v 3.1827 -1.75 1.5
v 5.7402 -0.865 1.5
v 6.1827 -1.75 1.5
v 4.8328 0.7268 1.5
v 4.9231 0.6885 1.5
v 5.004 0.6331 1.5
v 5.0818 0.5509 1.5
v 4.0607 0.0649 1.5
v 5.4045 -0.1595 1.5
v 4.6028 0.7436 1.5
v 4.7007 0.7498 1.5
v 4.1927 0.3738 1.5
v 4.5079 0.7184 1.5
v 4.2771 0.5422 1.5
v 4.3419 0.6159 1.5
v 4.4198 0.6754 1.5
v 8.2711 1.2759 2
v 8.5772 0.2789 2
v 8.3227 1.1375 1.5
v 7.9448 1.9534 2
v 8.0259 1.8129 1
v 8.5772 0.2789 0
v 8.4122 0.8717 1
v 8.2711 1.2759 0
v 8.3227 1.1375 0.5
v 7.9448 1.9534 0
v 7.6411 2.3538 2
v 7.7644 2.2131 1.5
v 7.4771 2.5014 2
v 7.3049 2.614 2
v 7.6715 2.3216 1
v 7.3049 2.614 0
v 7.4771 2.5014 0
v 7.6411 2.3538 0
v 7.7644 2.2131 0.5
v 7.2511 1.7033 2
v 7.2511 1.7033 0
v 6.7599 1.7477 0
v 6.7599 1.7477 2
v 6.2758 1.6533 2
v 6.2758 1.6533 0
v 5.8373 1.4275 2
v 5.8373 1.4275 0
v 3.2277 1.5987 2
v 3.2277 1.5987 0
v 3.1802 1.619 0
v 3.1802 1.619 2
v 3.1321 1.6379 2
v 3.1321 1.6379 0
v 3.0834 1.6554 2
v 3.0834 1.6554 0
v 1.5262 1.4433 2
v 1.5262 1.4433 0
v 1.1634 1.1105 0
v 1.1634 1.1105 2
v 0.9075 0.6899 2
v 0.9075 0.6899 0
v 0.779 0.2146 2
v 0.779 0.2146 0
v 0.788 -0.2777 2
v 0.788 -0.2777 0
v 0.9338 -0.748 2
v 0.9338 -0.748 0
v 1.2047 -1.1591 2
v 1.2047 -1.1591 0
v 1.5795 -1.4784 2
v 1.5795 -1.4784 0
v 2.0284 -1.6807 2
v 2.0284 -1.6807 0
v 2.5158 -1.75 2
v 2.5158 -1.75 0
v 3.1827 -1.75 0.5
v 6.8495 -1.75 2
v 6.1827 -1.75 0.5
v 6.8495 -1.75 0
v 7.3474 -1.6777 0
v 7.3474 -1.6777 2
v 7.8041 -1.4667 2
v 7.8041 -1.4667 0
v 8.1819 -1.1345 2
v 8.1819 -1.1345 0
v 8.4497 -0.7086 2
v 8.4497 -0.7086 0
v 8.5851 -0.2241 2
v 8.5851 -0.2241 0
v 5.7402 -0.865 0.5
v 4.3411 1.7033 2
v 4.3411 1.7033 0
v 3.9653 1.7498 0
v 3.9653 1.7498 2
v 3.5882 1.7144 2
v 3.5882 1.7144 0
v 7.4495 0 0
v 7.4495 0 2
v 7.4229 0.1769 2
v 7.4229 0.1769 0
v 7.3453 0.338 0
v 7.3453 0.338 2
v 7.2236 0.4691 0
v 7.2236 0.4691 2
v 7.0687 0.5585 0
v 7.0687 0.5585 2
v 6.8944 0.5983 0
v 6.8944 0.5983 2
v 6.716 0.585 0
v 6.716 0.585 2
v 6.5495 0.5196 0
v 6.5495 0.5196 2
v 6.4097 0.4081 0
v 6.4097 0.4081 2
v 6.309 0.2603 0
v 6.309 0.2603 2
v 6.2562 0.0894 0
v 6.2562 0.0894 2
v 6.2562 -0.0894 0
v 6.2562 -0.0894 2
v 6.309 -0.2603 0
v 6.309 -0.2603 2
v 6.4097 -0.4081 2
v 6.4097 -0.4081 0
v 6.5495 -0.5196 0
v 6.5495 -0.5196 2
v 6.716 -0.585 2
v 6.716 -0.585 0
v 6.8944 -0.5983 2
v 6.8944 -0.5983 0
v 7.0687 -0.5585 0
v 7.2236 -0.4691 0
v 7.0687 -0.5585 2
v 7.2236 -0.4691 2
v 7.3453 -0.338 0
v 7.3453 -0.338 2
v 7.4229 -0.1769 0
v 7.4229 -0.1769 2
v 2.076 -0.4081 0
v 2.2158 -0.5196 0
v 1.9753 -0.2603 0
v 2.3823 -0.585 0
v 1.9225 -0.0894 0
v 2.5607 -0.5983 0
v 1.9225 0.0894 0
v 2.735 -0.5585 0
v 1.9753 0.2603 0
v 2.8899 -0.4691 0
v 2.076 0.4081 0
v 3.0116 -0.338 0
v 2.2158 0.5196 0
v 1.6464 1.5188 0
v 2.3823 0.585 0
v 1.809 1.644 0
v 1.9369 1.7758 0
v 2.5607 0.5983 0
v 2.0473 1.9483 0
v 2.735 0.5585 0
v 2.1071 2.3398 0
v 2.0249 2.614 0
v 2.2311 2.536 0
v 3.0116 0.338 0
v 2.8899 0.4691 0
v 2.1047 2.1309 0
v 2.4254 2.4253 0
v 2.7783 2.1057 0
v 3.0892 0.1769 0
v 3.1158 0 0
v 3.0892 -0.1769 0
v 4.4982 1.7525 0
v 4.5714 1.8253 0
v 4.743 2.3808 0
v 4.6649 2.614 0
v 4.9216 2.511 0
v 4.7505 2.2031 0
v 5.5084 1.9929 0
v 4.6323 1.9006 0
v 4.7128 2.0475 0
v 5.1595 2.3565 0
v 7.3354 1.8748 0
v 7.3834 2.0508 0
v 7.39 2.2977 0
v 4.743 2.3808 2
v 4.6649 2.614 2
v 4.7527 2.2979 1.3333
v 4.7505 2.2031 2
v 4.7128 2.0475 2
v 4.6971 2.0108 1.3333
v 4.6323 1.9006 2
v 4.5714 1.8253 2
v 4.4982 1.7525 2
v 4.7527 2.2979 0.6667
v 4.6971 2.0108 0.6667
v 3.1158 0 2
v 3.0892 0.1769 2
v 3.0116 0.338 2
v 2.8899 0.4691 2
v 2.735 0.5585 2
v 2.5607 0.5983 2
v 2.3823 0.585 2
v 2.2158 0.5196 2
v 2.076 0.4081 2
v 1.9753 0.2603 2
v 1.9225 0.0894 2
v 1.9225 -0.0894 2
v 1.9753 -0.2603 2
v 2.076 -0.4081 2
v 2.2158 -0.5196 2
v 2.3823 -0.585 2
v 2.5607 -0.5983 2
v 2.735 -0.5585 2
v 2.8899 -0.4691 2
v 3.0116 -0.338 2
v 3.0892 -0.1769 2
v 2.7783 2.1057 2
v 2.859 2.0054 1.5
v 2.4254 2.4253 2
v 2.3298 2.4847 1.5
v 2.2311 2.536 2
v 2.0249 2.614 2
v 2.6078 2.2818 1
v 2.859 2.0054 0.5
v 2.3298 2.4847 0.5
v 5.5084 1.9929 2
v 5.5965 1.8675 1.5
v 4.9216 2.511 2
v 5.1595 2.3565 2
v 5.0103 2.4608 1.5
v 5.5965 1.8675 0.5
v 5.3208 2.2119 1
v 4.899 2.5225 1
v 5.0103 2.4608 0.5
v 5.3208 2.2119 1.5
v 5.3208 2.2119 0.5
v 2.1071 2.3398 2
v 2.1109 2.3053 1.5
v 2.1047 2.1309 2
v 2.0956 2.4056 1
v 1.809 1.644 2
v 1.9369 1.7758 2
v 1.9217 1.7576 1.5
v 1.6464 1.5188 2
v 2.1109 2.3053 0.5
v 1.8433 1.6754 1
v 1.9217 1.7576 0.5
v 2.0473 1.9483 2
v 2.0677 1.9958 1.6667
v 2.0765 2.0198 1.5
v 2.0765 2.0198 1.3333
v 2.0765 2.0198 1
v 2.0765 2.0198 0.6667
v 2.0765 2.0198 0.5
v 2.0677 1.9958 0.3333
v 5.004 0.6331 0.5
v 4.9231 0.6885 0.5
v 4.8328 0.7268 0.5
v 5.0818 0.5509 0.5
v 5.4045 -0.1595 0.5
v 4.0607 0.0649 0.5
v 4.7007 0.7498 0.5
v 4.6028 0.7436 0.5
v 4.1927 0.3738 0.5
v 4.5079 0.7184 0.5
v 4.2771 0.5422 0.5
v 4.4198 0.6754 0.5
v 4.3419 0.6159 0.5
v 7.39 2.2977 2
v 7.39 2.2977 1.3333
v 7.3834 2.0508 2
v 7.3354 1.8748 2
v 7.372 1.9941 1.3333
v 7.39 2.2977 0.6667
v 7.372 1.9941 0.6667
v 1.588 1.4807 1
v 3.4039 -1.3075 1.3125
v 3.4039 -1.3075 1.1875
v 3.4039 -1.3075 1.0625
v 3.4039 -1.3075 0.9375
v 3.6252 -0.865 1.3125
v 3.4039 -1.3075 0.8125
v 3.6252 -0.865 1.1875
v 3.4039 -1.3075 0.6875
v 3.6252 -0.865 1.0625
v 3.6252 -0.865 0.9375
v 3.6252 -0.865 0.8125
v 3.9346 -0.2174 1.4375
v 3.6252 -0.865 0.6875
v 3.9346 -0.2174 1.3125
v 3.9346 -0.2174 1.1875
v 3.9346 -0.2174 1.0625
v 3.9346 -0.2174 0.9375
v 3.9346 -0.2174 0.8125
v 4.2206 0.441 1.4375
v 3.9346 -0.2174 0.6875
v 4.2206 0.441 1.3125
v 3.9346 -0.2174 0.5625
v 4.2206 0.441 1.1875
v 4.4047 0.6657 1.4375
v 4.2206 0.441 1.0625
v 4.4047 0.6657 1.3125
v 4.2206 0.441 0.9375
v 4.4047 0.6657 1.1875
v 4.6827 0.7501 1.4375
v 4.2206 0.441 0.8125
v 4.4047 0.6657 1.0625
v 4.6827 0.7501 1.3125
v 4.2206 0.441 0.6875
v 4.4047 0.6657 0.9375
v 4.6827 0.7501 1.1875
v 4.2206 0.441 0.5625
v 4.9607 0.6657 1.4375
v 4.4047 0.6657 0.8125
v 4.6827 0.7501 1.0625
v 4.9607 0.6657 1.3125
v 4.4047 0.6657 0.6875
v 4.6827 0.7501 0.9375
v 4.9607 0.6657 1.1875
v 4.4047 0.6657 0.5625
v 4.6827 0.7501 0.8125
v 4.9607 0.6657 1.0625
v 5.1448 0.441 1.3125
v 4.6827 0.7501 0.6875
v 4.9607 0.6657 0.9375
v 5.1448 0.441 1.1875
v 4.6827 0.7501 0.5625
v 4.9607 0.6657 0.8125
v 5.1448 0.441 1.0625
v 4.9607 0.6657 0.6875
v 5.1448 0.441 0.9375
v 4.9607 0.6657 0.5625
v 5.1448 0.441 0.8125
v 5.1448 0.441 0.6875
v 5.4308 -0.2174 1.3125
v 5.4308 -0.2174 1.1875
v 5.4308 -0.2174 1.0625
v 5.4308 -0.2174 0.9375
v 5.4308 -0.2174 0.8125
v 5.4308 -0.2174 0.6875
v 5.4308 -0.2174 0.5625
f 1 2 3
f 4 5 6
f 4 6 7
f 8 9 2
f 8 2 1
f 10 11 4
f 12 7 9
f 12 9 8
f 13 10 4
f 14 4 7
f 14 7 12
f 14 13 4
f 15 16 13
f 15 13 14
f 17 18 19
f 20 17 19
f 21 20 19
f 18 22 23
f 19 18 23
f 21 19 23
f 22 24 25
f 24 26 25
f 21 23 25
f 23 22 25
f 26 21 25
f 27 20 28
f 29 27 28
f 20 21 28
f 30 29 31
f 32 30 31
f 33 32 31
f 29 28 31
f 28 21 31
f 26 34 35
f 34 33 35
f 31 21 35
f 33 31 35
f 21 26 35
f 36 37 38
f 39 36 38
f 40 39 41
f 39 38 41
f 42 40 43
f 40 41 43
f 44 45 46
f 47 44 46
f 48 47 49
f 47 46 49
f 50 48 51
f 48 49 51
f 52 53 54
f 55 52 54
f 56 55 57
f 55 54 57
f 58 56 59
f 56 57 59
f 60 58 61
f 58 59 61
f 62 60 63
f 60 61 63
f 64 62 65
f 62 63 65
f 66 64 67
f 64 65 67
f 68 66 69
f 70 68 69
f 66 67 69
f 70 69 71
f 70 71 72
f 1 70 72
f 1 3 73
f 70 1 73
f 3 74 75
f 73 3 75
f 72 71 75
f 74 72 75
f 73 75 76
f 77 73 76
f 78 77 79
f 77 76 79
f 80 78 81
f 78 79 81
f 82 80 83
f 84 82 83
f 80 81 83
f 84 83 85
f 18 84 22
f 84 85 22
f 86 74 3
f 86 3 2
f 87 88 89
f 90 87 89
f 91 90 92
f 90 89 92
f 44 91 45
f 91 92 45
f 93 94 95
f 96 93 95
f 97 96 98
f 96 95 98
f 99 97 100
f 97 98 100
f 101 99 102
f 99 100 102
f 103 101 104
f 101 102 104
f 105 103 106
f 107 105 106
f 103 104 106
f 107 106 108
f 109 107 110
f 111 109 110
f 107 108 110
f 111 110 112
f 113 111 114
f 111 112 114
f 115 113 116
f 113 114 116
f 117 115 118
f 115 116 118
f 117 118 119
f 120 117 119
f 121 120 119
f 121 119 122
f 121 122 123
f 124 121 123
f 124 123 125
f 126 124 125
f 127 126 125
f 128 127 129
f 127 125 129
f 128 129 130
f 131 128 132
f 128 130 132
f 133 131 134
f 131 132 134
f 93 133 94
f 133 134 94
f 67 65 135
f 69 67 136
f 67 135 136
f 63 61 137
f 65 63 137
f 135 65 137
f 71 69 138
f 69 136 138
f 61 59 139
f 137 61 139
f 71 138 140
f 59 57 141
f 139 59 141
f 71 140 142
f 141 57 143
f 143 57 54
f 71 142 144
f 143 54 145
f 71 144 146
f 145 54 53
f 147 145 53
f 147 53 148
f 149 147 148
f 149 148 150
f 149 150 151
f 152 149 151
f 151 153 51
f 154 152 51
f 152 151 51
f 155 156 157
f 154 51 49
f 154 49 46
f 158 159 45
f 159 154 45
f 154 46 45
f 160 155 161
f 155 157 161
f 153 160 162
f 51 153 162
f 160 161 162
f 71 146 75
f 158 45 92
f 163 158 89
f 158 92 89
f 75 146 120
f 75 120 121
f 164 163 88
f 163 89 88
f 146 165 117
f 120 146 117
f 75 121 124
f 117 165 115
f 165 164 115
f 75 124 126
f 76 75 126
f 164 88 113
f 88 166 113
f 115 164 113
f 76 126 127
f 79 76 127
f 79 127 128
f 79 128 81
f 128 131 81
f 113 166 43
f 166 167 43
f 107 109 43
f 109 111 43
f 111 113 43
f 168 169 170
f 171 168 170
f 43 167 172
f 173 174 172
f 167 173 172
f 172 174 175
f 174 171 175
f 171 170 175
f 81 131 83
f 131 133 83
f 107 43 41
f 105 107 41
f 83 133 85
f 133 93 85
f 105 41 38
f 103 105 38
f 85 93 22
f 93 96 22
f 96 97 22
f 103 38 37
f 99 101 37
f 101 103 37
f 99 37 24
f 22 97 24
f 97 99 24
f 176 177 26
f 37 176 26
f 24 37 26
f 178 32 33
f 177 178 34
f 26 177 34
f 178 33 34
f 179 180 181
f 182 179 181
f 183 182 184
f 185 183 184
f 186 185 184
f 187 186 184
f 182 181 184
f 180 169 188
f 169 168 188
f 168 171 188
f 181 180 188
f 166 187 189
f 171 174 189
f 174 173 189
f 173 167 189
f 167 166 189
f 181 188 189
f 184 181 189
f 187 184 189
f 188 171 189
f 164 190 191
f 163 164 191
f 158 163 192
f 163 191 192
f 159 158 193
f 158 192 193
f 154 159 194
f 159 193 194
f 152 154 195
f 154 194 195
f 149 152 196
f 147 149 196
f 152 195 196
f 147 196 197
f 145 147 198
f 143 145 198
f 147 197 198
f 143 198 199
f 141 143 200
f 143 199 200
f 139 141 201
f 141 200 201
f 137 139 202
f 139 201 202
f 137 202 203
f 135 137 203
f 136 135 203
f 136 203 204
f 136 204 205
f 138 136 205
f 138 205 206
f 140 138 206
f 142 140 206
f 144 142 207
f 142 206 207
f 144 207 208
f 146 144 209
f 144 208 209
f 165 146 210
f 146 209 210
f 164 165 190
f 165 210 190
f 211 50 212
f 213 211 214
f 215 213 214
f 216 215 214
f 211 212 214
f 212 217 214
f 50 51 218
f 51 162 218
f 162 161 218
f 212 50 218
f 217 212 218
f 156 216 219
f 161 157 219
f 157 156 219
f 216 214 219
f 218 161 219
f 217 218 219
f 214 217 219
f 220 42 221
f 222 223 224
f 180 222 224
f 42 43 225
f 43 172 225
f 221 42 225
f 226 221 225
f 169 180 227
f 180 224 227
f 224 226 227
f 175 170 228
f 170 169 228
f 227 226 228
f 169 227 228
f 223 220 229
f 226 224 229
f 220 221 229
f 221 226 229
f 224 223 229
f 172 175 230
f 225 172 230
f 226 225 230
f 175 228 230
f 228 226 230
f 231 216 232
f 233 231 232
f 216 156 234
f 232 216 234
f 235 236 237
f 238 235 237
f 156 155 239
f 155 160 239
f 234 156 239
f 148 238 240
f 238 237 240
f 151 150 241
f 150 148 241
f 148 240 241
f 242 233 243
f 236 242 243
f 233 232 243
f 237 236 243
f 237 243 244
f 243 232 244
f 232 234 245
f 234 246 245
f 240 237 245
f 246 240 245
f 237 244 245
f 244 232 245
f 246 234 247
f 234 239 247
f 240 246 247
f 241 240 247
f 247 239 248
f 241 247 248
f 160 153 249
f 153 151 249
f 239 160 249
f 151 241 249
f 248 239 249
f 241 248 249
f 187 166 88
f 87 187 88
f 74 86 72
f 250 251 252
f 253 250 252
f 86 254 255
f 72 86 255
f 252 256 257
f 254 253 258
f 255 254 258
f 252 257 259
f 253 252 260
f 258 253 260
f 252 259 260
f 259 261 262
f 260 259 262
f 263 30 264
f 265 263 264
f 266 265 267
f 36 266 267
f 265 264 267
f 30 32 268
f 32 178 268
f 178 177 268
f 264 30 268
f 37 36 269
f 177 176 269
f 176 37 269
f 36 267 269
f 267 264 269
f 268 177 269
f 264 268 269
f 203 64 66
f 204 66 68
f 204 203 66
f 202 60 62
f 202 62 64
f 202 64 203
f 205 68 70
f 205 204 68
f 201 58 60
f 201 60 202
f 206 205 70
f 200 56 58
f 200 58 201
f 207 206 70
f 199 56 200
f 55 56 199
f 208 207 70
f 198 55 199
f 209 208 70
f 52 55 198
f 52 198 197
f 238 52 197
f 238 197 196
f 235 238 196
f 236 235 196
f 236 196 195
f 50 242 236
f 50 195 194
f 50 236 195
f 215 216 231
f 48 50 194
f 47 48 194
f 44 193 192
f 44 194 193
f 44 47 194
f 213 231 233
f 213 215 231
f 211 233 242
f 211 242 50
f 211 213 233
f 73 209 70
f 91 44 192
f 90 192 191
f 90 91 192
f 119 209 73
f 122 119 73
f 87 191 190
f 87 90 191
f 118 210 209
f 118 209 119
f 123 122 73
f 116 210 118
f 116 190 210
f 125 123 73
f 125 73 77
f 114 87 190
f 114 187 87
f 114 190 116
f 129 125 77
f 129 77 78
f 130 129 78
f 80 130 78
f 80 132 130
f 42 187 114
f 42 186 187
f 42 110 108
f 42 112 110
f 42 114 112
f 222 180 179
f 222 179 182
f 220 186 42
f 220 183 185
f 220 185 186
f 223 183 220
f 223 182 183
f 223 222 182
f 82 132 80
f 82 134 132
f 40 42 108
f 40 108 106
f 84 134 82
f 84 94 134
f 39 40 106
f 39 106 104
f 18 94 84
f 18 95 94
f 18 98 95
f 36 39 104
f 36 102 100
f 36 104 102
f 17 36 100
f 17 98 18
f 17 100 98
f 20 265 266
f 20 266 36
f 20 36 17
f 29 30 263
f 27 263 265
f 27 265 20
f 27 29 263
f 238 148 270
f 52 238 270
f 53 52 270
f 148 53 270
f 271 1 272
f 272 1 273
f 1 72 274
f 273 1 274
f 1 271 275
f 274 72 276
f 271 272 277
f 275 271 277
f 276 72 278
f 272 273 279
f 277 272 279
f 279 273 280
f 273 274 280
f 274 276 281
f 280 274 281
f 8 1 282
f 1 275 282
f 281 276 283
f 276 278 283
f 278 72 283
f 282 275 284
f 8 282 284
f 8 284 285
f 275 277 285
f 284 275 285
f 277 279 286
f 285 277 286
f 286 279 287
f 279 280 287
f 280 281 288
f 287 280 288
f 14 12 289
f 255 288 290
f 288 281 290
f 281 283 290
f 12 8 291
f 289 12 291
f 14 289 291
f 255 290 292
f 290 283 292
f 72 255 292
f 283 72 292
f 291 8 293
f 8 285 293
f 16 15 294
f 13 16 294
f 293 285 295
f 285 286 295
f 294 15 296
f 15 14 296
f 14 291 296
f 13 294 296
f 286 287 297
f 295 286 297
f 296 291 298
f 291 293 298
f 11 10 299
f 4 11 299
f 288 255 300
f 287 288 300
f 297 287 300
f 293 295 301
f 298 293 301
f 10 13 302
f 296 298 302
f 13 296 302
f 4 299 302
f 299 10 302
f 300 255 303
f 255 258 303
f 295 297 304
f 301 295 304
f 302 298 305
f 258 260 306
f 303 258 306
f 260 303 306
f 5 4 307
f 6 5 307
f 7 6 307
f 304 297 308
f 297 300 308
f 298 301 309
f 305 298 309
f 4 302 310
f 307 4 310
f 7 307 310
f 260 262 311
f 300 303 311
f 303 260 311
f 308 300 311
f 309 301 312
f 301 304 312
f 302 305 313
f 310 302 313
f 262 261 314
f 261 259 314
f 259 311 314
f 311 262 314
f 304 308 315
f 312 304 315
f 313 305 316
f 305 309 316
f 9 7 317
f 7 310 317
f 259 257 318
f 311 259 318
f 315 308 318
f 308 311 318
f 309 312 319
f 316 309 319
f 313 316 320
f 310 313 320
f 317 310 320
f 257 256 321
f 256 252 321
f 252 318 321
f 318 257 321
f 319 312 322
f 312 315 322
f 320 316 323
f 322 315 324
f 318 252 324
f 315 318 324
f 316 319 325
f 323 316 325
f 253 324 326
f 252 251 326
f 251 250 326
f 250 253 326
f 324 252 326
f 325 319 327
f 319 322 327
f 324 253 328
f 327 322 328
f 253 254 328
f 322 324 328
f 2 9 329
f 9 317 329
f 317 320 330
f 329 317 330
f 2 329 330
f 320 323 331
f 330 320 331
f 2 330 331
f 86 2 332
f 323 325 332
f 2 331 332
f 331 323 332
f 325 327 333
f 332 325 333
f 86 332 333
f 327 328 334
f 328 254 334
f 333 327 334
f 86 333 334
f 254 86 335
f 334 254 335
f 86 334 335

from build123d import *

# Parameters (mm, degrees)
BOSS_EXTRUDE1_DEPTH = 2
SKETCH2_R           = 0.6
CUT_EXTRUDE1_DEPTH  = 2
BOUNDARY_CUT1_START = 0.5
BOUNDARY_CUT1_DEPTH = 1


# Read off the part's stored shape, not the designer's step: Boundary-Cut1
with BuildPart() as part:
    # Sketch1 → Boss-Extrude1 (new body)
    with BuildSketch(Plane.XY):
        with BuildLine():
            ThreePointArc((1.526225881, 1.443320919), (0.844261398, -0.518019494), (2.515834251, -1.75))
            Line((2.515834251, -1.75), (6.849532383, -1.75))
            ThreePointArc((6.849532383, -1.75), (8.181942233, -1.134541314), (8.577159836, 0.278932579))
            add(Edge.make_bspline(
                [(8.577159836, 0.278932579), (8.110700048, 2.179296341), (7.304925461, 2.614034863)],
                knots=[0, 0, 0, 1, 1, 1], degree=2))
            add(Edge.make_bspline(
                [(7.304925461, 2.614034863), (7.441478628, 2.291307156), (7.423521915, 1.987733608), (7.251055322, 1.703314219)],
                knots=[0, 0, 0, 0, 0.668538786, 0.668538786, 0.668538786, 0.668538786], degree=3))
            ThreePointArc((7.251055322, 1.703314219), (6.514478451, 1.717625938), (5.837281377, 1.427532101))
            add(Edge.make_bspline(
                [(5.837281377, 1.427532101), (5.390462193, 2.403045527), (4.664925461, 2.614034863)],
                knots=[0.307788008, 0.307788008, 0.307788008, 1, 1, 1], degree=2))
            add(Edge.make_bspline(
                [(4.664925461, 2.614034863), (4.824318966, 2.283493667), (4.768740332, 1.996314703), (4.498189559, 1.752497972)],
                knots=[0, 0, 0, 0, 0.792020938, 0.792020938, 0.792020938, 0.792020938], degree=3))
            Line((4.498189559, 1.752497972), (4.341055322, 1.703314219))
            ThreePointArc((4.341055322, 1.703314219), (3.775786335, 1.742322367), (3.227683317, 1.598677862))
            ThreePointArc((3.227683317, 1.598677862), (3.156194107, 1.628631099), (3.083448661, 1.655389344))
            add(Edge.make_bspline(
                [(3.083448661, 1.655389344), (2.661448554, 2.428931092), (2.024925461, 2.614034863)],
                knots=[0.392713148, 0.392713148, 0.392713148, 1, 1, 1], degree=2))
            add(Edge.make_bspline(
                [(2.024925461, 2.614034863), (2.317287968, 1.973197345), (1.646435899, 1.518764796)],
                knots=[0, 0, 0, 0.922107406, 0.922107406, 0.922107406], degree=2))
            add(Edge.make_bspline(
                [(1.646435899, 1.518764796), (1.589767438, 1.480377803), (1.526225881, 1.443320919)],
                knots=[0.922107406, 0.922107406, 0.922107406, 1, 1, 1], degree=2))
        make_face()
    extrude(amount=BOSS_EXTRUDE1_DEPTH)

    # Sketch2 → Cut-Extrude1 (cut)
    with BuildSketch(Plane.XY.offset(2)):
        with Locations((6.849532383, 0)):
            Circle(SKETCH2_R)
        with Locations((2.515834251, 0)):
            Circle(SKETCH2_R)
    extrude(amount=-CUT_EXTRUDE1_DEPTH, mode=Mode.SUBTRACT)

    # Boundary-Cut1 outline → Boundary-Cut1 (cut)
    with BuildSketch(Plane.XY.offset(BOUNDARY_CUT1_START)):
        with BuildLine():
            add(Edge.make_bspline(
                [(3.182683317, -1.75), (3.219559269, -1.676248097), (3.293311172, -1.528744291), (3.403939026, -1.307488582), (3.51456688, -1.086232874), (3.588340093, -0.938686449), (3.678709694, -0.757947245), (3.783775446, -0.543015437), (3.935584986, -0.217797229), (4.081534514, 0.110092623), (4.174899608, 0.330404865), (4.258110172, 0.531765281), (4.388021164, 0.690444526), (4.682683317, 0.779920411), (4.97734547, 0.690444526), (5.107256462, 0.531765281), (5.190467027, 0.330404865), (5.28383212, 0.110092623), (5.429781648, -0.217797229), (5.581591188, -0.543015437), (5.686671615, -0.757976596), (5.7401719, -0.864977165)],
                knots=[0, 0, 0, 0, 0.049050349, 0.098100699, 0.147151048, 0.196201398, 0.196201398, 0.267425193, 0.338648988, 0.409872783, 0.481096578, 0.481096578, 0.539598638, 0.598100699, 0.656602759, 0.71510482, 0.71510482, 0.786328615, 0.85755241, 0.928776205, 1, 1, 1, 1], degree=3))
            Line((3.182683317, -1.75), (6.182683317, -1.75))
            Line((6.182683317, -1.75), (5.7401719, -0.864977165))
        make_face()
    extrude(amount=BOUNDARY_CUT1_DEPTH, mode=Mode.SUBTRACT)


solid = part.part
